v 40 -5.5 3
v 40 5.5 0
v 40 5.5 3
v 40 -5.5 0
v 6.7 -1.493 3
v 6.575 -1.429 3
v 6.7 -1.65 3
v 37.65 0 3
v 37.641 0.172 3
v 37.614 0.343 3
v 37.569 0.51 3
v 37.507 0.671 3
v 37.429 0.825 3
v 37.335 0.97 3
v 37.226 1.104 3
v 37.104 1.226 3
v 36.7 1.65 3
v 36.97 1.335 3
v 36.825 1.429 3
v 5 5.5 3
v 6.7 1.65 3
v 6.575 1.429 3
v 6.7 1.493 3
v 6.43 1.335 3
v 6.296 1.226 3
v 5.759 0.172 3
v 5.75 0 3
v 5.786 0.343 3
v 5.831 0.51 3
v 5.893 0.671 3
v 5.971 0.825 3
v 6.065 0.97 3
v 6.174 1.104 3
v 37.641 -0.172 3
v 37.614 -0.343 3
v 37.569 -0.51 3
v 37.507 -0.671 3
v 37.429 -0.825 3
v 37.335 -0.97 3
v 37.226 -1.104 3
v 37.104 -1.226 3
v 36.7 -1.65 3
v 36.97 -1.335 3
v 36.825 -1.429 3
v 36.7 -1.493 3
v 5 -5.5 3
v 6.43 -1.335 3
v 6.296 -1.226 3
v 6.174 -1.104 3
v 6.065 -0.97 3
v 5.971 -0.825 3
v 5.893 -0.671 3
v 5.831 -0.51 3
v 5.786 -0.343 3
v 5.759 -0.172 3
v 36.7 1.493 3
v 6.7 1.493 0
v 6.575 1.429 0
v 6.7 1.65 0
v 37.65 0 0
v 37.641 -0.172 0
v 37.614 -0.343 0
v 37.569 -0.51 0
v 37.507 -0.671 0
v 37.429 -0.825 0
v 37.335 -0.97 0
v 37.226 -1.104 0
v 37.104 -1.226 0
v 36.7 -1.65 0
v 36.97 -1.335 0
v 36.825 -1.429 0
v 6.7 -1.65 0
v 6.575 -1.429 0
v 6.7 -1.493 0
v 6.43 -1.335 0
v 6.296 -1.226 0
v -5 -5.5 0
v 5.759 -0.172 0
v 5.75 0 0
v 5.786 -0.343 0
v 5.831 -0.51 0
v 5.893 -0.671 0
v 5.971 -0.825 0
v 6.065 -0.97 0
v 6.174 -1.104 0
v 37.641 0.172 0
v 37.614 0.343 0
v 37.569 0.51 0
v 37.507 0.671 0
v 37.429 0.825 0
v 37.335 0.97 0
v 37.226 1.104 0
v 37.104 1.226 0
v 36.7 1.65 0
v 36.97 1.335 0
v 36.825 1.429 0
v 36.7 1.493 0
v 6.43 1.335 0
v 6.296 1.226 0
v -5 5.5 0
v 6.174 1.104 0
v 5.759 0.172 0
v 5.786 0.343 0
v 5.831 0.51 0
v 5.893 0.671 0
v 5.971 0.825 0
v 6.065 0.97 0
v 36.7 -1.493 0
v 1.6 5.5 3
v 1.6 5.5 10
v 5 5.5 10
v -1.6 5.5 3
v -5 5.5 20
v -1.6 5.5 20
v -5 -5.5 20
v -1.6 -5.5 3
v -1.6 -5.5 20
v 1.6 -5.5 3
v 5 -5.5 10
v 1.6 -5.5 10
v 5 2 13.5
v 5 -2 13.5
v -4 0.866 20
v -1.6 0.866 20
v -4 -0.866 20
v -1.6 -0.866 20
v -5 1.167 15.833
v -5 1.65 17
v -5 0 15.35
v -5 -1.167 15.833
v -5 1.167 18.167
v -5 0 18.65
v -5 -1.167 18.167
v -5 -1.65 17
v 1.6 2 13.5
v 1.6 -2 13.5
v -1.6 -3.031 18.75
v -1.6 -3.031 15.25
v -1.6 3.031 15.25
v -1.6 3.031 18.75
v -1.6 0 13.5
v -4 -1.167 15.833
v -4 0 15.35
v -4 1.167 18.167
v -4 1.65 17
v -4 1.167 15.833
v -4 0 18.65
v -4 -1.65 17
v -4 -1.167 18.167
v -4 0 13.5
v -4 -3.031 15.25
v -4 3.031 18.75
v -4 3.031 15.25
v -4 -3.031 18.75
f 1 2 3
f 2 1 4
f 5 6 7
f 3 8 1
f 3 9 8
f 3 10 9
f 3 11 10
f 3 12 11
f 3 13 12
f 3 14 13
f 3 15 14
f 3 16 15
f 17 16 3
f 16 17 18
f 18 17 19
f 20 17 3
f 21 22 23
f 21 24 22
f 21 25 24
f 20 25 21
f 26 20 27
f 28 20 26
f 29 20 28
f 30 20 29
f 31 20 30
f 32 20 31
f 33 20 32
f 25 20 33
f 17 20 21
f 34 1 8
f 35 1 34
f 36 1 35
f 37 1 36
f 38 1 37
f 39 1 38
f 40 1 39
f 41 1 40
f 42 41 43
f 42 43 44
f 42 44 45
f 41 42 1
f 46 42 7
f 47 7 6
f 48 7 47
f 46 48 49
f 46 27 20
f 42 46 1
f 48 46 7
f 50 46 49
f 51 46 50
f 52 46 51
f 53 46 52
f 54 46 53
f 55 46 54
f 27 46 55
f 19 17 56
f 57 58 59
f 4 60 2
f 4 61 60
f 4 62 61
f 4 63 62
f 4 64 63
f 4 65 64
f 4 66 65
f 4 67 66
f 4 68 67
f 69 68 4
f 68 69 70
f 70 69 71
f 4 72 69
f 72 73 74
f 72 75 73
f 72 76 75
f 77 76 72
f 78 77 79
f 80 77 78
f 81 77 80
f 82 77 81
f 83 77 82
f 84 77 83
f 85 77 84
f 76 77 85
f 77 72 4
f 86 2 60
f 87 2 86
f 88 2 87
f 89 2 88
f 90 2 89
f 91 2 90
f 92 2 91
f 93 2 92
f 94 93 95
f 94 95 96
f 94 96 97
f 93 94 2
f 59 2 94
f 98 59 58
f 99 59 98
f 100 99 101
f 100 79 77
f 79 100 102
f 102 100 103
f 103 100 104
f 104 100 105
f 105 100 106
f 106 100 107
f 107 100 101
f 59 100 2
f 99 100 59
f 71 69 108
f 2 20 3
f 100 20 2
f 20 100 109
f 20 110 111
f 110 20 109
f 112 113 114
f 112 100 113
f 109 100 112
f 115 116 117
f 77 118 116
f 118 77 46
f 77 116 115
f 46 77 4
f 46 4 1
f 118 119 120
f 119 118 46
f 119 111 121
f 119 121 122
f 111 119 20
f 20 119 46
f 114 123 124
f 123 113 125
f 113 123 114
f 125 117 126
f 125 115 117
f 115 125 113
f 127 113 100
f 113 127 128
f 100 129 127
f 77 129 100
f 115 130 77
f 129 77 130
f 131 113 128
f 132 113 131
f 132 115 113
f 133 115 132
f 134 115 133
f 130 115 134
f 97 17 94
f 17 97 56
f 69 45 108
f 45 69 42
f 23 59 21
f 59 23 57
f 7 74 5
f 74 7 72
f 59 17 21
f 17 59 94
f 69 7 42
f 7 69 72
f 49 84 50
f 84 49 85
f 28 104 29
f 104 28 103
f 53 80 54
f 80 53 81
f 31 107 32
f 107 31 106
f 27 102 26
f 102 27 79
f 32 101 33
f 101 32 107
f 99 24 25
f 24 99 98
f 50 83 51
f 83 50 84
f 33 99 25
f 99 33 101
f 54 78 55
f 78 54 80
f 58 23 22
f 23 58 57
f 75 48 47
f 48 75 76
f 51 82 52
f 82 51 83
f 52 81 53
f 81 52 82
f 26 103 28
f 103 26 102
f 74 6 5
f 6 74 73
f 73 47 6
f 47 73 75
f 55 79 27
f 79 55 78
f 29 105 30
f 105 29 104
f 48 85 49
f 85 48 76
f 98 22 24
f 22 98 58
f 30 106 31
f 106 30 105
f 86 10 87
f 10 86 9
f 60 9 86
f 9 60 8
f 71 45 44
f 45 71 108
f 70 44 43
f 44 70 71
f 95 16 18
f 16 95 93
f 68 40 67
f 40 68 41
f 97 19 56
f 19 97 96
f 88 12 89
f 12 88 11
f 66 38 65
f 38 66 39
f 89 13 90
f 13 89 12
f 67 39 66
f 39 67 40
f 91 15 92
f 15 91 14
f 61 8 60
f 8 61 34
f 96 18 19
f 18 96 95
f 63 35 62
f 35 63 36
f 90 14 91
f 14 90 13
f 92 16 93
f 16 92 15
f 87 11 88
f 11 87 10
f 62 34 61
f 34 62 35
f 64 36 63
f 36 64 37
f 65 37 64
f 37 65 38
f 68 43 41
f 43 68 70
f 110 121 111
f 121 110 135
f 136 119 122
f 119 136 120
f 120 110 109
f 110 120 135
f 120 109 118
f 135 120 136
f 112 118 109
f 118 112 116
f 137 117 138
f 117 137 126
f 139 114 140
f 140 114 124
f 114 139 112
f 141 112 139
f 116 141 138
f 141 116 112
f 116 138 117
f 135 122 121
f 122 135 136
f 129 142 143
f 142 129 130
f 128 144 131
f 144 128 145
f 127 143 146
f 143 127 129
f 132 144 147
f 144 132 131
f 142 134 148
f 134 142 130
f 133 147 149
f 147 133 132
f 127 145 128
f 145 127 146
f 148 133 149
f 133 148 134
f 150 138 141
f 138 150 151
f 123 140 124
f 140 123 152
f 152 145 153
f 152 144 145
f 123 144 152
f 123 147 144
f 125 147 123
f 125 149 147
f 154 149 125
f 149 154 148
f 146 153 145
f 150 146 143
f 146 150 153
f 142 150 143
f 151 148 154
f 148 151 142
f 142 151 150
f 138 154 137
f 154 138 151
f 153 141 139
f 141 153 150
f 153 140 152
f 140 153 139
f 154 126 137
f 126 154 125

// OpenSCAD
// Robot DC-motor: sensor keyesIR - holder

// Vertical part.
h_vert = 40;
w_vert = 11;
d_vert =  3;

// Internal diameter of nut.
id_nut = 3.3;

// Out diameter of nut.
od_nut = 7;

// Height of nut.
h_nut = 4;

// Length and diameter of screws.
len_screw = 20;
dia_screw = 3.3;

// Horizontal part.
h_horiz = 10;
w_horiz = 11;
d_horiz =  20;

// Width of chassis.
w_chassis = 3.2;

// Vertical hole.
h_vhole = h_vert - 2*id_nut - (h_horiz - w_chassis)/2;
w_vhole = id_nut;
d_vhole =  10;

// Width of chassis.
w_chassis = 3.2;

// Horizontal hole.
h_hhole = w_chassis;
w_hhole = w_horiz+1;
d_hhole = d_horiz;

// Block of nut.
h_nut_hole = (h_horiz - w_chassis)/2 + 1;
w_nut_hole = w_horiz+1;
d_nut_hole = od_nut;


module solid_part() {
  union() {
// Vertical part.
    translate([h_vert/2, 0, d_vert/2])
      cube([h_vert, w_vert, d_vert], center = true);
    
// Horizontal part.
    translate([0, 0, d_horiz/2])
      cube([h_horiz, w_horiz, d_horiz], center = true);
  }    
}    

module  holes() {
    
  union() {    
// Vertical hole.
    translate([h_vhole/2 + id_nut + (h_horiz - w_chassis)/2, 0, d_vhole/2 - 0.5])  
      cube([h_vhole, w_vhole, d_vhole], center = true);
    translate([h_vhole/2 + (h_horiz - w_chassis)/2 - h_horiz - 1, 0, 0])
      cylinder(r = w_vhole/2, h = h_vhole, $fn = 60, center = true);
    translate([h_vhole/2 + (h_horiz - w_chassis)/2 + h_horiz + 1 + 2*id_nut, 0, 0])
      cylinder(r = w_vhole/2, h = h_vhole, $fn = 60, center = true);
      
    translate([1, w_horiz/2, d_horiz/2])
      rotate([45, 0, 0])
        cube([5, 5, 5]);
    translate([1, -w_horiz/2, d_horiz/2])
      rotate([45, 0, 0])
        cube([5, 5, 5]);
      
    
    
// Horizontal hole.
    translate([0, 0, d_horiz/2 + d_vert])
      cube([h_hhole, w_hhole, d_hhole], center = true);  

// Block of nut.
    translate([(h_horiz - w_chassis)/2, 0, d_horiz/2 + d_nut_hole])
      cube([h_nut_hole, w_nut_hole, d_nut_hole], center = true);  

// Screw hole.
    translate([0, 0, d_horiz/2 + d_nut_hole])
      rotate(a=[0,90,0])      
        cylinder(h = len_screw, r1 = dia_screw/2, r2 = dia_screw/2, $fn = 8, center = true);      
        

// Nut hole.
    translate([-h_nut/2, 0, d_horiz/2 + d_nut_hole])
      rotate(a=[ 0, 90, 0])      
        cylinder(h = h_nut, r1 = od_nut/2, r2 = od_nut/2, $fn = 6, center = true);      
  }      

}

difference() {
  solid_part();
  holes();  
}  
